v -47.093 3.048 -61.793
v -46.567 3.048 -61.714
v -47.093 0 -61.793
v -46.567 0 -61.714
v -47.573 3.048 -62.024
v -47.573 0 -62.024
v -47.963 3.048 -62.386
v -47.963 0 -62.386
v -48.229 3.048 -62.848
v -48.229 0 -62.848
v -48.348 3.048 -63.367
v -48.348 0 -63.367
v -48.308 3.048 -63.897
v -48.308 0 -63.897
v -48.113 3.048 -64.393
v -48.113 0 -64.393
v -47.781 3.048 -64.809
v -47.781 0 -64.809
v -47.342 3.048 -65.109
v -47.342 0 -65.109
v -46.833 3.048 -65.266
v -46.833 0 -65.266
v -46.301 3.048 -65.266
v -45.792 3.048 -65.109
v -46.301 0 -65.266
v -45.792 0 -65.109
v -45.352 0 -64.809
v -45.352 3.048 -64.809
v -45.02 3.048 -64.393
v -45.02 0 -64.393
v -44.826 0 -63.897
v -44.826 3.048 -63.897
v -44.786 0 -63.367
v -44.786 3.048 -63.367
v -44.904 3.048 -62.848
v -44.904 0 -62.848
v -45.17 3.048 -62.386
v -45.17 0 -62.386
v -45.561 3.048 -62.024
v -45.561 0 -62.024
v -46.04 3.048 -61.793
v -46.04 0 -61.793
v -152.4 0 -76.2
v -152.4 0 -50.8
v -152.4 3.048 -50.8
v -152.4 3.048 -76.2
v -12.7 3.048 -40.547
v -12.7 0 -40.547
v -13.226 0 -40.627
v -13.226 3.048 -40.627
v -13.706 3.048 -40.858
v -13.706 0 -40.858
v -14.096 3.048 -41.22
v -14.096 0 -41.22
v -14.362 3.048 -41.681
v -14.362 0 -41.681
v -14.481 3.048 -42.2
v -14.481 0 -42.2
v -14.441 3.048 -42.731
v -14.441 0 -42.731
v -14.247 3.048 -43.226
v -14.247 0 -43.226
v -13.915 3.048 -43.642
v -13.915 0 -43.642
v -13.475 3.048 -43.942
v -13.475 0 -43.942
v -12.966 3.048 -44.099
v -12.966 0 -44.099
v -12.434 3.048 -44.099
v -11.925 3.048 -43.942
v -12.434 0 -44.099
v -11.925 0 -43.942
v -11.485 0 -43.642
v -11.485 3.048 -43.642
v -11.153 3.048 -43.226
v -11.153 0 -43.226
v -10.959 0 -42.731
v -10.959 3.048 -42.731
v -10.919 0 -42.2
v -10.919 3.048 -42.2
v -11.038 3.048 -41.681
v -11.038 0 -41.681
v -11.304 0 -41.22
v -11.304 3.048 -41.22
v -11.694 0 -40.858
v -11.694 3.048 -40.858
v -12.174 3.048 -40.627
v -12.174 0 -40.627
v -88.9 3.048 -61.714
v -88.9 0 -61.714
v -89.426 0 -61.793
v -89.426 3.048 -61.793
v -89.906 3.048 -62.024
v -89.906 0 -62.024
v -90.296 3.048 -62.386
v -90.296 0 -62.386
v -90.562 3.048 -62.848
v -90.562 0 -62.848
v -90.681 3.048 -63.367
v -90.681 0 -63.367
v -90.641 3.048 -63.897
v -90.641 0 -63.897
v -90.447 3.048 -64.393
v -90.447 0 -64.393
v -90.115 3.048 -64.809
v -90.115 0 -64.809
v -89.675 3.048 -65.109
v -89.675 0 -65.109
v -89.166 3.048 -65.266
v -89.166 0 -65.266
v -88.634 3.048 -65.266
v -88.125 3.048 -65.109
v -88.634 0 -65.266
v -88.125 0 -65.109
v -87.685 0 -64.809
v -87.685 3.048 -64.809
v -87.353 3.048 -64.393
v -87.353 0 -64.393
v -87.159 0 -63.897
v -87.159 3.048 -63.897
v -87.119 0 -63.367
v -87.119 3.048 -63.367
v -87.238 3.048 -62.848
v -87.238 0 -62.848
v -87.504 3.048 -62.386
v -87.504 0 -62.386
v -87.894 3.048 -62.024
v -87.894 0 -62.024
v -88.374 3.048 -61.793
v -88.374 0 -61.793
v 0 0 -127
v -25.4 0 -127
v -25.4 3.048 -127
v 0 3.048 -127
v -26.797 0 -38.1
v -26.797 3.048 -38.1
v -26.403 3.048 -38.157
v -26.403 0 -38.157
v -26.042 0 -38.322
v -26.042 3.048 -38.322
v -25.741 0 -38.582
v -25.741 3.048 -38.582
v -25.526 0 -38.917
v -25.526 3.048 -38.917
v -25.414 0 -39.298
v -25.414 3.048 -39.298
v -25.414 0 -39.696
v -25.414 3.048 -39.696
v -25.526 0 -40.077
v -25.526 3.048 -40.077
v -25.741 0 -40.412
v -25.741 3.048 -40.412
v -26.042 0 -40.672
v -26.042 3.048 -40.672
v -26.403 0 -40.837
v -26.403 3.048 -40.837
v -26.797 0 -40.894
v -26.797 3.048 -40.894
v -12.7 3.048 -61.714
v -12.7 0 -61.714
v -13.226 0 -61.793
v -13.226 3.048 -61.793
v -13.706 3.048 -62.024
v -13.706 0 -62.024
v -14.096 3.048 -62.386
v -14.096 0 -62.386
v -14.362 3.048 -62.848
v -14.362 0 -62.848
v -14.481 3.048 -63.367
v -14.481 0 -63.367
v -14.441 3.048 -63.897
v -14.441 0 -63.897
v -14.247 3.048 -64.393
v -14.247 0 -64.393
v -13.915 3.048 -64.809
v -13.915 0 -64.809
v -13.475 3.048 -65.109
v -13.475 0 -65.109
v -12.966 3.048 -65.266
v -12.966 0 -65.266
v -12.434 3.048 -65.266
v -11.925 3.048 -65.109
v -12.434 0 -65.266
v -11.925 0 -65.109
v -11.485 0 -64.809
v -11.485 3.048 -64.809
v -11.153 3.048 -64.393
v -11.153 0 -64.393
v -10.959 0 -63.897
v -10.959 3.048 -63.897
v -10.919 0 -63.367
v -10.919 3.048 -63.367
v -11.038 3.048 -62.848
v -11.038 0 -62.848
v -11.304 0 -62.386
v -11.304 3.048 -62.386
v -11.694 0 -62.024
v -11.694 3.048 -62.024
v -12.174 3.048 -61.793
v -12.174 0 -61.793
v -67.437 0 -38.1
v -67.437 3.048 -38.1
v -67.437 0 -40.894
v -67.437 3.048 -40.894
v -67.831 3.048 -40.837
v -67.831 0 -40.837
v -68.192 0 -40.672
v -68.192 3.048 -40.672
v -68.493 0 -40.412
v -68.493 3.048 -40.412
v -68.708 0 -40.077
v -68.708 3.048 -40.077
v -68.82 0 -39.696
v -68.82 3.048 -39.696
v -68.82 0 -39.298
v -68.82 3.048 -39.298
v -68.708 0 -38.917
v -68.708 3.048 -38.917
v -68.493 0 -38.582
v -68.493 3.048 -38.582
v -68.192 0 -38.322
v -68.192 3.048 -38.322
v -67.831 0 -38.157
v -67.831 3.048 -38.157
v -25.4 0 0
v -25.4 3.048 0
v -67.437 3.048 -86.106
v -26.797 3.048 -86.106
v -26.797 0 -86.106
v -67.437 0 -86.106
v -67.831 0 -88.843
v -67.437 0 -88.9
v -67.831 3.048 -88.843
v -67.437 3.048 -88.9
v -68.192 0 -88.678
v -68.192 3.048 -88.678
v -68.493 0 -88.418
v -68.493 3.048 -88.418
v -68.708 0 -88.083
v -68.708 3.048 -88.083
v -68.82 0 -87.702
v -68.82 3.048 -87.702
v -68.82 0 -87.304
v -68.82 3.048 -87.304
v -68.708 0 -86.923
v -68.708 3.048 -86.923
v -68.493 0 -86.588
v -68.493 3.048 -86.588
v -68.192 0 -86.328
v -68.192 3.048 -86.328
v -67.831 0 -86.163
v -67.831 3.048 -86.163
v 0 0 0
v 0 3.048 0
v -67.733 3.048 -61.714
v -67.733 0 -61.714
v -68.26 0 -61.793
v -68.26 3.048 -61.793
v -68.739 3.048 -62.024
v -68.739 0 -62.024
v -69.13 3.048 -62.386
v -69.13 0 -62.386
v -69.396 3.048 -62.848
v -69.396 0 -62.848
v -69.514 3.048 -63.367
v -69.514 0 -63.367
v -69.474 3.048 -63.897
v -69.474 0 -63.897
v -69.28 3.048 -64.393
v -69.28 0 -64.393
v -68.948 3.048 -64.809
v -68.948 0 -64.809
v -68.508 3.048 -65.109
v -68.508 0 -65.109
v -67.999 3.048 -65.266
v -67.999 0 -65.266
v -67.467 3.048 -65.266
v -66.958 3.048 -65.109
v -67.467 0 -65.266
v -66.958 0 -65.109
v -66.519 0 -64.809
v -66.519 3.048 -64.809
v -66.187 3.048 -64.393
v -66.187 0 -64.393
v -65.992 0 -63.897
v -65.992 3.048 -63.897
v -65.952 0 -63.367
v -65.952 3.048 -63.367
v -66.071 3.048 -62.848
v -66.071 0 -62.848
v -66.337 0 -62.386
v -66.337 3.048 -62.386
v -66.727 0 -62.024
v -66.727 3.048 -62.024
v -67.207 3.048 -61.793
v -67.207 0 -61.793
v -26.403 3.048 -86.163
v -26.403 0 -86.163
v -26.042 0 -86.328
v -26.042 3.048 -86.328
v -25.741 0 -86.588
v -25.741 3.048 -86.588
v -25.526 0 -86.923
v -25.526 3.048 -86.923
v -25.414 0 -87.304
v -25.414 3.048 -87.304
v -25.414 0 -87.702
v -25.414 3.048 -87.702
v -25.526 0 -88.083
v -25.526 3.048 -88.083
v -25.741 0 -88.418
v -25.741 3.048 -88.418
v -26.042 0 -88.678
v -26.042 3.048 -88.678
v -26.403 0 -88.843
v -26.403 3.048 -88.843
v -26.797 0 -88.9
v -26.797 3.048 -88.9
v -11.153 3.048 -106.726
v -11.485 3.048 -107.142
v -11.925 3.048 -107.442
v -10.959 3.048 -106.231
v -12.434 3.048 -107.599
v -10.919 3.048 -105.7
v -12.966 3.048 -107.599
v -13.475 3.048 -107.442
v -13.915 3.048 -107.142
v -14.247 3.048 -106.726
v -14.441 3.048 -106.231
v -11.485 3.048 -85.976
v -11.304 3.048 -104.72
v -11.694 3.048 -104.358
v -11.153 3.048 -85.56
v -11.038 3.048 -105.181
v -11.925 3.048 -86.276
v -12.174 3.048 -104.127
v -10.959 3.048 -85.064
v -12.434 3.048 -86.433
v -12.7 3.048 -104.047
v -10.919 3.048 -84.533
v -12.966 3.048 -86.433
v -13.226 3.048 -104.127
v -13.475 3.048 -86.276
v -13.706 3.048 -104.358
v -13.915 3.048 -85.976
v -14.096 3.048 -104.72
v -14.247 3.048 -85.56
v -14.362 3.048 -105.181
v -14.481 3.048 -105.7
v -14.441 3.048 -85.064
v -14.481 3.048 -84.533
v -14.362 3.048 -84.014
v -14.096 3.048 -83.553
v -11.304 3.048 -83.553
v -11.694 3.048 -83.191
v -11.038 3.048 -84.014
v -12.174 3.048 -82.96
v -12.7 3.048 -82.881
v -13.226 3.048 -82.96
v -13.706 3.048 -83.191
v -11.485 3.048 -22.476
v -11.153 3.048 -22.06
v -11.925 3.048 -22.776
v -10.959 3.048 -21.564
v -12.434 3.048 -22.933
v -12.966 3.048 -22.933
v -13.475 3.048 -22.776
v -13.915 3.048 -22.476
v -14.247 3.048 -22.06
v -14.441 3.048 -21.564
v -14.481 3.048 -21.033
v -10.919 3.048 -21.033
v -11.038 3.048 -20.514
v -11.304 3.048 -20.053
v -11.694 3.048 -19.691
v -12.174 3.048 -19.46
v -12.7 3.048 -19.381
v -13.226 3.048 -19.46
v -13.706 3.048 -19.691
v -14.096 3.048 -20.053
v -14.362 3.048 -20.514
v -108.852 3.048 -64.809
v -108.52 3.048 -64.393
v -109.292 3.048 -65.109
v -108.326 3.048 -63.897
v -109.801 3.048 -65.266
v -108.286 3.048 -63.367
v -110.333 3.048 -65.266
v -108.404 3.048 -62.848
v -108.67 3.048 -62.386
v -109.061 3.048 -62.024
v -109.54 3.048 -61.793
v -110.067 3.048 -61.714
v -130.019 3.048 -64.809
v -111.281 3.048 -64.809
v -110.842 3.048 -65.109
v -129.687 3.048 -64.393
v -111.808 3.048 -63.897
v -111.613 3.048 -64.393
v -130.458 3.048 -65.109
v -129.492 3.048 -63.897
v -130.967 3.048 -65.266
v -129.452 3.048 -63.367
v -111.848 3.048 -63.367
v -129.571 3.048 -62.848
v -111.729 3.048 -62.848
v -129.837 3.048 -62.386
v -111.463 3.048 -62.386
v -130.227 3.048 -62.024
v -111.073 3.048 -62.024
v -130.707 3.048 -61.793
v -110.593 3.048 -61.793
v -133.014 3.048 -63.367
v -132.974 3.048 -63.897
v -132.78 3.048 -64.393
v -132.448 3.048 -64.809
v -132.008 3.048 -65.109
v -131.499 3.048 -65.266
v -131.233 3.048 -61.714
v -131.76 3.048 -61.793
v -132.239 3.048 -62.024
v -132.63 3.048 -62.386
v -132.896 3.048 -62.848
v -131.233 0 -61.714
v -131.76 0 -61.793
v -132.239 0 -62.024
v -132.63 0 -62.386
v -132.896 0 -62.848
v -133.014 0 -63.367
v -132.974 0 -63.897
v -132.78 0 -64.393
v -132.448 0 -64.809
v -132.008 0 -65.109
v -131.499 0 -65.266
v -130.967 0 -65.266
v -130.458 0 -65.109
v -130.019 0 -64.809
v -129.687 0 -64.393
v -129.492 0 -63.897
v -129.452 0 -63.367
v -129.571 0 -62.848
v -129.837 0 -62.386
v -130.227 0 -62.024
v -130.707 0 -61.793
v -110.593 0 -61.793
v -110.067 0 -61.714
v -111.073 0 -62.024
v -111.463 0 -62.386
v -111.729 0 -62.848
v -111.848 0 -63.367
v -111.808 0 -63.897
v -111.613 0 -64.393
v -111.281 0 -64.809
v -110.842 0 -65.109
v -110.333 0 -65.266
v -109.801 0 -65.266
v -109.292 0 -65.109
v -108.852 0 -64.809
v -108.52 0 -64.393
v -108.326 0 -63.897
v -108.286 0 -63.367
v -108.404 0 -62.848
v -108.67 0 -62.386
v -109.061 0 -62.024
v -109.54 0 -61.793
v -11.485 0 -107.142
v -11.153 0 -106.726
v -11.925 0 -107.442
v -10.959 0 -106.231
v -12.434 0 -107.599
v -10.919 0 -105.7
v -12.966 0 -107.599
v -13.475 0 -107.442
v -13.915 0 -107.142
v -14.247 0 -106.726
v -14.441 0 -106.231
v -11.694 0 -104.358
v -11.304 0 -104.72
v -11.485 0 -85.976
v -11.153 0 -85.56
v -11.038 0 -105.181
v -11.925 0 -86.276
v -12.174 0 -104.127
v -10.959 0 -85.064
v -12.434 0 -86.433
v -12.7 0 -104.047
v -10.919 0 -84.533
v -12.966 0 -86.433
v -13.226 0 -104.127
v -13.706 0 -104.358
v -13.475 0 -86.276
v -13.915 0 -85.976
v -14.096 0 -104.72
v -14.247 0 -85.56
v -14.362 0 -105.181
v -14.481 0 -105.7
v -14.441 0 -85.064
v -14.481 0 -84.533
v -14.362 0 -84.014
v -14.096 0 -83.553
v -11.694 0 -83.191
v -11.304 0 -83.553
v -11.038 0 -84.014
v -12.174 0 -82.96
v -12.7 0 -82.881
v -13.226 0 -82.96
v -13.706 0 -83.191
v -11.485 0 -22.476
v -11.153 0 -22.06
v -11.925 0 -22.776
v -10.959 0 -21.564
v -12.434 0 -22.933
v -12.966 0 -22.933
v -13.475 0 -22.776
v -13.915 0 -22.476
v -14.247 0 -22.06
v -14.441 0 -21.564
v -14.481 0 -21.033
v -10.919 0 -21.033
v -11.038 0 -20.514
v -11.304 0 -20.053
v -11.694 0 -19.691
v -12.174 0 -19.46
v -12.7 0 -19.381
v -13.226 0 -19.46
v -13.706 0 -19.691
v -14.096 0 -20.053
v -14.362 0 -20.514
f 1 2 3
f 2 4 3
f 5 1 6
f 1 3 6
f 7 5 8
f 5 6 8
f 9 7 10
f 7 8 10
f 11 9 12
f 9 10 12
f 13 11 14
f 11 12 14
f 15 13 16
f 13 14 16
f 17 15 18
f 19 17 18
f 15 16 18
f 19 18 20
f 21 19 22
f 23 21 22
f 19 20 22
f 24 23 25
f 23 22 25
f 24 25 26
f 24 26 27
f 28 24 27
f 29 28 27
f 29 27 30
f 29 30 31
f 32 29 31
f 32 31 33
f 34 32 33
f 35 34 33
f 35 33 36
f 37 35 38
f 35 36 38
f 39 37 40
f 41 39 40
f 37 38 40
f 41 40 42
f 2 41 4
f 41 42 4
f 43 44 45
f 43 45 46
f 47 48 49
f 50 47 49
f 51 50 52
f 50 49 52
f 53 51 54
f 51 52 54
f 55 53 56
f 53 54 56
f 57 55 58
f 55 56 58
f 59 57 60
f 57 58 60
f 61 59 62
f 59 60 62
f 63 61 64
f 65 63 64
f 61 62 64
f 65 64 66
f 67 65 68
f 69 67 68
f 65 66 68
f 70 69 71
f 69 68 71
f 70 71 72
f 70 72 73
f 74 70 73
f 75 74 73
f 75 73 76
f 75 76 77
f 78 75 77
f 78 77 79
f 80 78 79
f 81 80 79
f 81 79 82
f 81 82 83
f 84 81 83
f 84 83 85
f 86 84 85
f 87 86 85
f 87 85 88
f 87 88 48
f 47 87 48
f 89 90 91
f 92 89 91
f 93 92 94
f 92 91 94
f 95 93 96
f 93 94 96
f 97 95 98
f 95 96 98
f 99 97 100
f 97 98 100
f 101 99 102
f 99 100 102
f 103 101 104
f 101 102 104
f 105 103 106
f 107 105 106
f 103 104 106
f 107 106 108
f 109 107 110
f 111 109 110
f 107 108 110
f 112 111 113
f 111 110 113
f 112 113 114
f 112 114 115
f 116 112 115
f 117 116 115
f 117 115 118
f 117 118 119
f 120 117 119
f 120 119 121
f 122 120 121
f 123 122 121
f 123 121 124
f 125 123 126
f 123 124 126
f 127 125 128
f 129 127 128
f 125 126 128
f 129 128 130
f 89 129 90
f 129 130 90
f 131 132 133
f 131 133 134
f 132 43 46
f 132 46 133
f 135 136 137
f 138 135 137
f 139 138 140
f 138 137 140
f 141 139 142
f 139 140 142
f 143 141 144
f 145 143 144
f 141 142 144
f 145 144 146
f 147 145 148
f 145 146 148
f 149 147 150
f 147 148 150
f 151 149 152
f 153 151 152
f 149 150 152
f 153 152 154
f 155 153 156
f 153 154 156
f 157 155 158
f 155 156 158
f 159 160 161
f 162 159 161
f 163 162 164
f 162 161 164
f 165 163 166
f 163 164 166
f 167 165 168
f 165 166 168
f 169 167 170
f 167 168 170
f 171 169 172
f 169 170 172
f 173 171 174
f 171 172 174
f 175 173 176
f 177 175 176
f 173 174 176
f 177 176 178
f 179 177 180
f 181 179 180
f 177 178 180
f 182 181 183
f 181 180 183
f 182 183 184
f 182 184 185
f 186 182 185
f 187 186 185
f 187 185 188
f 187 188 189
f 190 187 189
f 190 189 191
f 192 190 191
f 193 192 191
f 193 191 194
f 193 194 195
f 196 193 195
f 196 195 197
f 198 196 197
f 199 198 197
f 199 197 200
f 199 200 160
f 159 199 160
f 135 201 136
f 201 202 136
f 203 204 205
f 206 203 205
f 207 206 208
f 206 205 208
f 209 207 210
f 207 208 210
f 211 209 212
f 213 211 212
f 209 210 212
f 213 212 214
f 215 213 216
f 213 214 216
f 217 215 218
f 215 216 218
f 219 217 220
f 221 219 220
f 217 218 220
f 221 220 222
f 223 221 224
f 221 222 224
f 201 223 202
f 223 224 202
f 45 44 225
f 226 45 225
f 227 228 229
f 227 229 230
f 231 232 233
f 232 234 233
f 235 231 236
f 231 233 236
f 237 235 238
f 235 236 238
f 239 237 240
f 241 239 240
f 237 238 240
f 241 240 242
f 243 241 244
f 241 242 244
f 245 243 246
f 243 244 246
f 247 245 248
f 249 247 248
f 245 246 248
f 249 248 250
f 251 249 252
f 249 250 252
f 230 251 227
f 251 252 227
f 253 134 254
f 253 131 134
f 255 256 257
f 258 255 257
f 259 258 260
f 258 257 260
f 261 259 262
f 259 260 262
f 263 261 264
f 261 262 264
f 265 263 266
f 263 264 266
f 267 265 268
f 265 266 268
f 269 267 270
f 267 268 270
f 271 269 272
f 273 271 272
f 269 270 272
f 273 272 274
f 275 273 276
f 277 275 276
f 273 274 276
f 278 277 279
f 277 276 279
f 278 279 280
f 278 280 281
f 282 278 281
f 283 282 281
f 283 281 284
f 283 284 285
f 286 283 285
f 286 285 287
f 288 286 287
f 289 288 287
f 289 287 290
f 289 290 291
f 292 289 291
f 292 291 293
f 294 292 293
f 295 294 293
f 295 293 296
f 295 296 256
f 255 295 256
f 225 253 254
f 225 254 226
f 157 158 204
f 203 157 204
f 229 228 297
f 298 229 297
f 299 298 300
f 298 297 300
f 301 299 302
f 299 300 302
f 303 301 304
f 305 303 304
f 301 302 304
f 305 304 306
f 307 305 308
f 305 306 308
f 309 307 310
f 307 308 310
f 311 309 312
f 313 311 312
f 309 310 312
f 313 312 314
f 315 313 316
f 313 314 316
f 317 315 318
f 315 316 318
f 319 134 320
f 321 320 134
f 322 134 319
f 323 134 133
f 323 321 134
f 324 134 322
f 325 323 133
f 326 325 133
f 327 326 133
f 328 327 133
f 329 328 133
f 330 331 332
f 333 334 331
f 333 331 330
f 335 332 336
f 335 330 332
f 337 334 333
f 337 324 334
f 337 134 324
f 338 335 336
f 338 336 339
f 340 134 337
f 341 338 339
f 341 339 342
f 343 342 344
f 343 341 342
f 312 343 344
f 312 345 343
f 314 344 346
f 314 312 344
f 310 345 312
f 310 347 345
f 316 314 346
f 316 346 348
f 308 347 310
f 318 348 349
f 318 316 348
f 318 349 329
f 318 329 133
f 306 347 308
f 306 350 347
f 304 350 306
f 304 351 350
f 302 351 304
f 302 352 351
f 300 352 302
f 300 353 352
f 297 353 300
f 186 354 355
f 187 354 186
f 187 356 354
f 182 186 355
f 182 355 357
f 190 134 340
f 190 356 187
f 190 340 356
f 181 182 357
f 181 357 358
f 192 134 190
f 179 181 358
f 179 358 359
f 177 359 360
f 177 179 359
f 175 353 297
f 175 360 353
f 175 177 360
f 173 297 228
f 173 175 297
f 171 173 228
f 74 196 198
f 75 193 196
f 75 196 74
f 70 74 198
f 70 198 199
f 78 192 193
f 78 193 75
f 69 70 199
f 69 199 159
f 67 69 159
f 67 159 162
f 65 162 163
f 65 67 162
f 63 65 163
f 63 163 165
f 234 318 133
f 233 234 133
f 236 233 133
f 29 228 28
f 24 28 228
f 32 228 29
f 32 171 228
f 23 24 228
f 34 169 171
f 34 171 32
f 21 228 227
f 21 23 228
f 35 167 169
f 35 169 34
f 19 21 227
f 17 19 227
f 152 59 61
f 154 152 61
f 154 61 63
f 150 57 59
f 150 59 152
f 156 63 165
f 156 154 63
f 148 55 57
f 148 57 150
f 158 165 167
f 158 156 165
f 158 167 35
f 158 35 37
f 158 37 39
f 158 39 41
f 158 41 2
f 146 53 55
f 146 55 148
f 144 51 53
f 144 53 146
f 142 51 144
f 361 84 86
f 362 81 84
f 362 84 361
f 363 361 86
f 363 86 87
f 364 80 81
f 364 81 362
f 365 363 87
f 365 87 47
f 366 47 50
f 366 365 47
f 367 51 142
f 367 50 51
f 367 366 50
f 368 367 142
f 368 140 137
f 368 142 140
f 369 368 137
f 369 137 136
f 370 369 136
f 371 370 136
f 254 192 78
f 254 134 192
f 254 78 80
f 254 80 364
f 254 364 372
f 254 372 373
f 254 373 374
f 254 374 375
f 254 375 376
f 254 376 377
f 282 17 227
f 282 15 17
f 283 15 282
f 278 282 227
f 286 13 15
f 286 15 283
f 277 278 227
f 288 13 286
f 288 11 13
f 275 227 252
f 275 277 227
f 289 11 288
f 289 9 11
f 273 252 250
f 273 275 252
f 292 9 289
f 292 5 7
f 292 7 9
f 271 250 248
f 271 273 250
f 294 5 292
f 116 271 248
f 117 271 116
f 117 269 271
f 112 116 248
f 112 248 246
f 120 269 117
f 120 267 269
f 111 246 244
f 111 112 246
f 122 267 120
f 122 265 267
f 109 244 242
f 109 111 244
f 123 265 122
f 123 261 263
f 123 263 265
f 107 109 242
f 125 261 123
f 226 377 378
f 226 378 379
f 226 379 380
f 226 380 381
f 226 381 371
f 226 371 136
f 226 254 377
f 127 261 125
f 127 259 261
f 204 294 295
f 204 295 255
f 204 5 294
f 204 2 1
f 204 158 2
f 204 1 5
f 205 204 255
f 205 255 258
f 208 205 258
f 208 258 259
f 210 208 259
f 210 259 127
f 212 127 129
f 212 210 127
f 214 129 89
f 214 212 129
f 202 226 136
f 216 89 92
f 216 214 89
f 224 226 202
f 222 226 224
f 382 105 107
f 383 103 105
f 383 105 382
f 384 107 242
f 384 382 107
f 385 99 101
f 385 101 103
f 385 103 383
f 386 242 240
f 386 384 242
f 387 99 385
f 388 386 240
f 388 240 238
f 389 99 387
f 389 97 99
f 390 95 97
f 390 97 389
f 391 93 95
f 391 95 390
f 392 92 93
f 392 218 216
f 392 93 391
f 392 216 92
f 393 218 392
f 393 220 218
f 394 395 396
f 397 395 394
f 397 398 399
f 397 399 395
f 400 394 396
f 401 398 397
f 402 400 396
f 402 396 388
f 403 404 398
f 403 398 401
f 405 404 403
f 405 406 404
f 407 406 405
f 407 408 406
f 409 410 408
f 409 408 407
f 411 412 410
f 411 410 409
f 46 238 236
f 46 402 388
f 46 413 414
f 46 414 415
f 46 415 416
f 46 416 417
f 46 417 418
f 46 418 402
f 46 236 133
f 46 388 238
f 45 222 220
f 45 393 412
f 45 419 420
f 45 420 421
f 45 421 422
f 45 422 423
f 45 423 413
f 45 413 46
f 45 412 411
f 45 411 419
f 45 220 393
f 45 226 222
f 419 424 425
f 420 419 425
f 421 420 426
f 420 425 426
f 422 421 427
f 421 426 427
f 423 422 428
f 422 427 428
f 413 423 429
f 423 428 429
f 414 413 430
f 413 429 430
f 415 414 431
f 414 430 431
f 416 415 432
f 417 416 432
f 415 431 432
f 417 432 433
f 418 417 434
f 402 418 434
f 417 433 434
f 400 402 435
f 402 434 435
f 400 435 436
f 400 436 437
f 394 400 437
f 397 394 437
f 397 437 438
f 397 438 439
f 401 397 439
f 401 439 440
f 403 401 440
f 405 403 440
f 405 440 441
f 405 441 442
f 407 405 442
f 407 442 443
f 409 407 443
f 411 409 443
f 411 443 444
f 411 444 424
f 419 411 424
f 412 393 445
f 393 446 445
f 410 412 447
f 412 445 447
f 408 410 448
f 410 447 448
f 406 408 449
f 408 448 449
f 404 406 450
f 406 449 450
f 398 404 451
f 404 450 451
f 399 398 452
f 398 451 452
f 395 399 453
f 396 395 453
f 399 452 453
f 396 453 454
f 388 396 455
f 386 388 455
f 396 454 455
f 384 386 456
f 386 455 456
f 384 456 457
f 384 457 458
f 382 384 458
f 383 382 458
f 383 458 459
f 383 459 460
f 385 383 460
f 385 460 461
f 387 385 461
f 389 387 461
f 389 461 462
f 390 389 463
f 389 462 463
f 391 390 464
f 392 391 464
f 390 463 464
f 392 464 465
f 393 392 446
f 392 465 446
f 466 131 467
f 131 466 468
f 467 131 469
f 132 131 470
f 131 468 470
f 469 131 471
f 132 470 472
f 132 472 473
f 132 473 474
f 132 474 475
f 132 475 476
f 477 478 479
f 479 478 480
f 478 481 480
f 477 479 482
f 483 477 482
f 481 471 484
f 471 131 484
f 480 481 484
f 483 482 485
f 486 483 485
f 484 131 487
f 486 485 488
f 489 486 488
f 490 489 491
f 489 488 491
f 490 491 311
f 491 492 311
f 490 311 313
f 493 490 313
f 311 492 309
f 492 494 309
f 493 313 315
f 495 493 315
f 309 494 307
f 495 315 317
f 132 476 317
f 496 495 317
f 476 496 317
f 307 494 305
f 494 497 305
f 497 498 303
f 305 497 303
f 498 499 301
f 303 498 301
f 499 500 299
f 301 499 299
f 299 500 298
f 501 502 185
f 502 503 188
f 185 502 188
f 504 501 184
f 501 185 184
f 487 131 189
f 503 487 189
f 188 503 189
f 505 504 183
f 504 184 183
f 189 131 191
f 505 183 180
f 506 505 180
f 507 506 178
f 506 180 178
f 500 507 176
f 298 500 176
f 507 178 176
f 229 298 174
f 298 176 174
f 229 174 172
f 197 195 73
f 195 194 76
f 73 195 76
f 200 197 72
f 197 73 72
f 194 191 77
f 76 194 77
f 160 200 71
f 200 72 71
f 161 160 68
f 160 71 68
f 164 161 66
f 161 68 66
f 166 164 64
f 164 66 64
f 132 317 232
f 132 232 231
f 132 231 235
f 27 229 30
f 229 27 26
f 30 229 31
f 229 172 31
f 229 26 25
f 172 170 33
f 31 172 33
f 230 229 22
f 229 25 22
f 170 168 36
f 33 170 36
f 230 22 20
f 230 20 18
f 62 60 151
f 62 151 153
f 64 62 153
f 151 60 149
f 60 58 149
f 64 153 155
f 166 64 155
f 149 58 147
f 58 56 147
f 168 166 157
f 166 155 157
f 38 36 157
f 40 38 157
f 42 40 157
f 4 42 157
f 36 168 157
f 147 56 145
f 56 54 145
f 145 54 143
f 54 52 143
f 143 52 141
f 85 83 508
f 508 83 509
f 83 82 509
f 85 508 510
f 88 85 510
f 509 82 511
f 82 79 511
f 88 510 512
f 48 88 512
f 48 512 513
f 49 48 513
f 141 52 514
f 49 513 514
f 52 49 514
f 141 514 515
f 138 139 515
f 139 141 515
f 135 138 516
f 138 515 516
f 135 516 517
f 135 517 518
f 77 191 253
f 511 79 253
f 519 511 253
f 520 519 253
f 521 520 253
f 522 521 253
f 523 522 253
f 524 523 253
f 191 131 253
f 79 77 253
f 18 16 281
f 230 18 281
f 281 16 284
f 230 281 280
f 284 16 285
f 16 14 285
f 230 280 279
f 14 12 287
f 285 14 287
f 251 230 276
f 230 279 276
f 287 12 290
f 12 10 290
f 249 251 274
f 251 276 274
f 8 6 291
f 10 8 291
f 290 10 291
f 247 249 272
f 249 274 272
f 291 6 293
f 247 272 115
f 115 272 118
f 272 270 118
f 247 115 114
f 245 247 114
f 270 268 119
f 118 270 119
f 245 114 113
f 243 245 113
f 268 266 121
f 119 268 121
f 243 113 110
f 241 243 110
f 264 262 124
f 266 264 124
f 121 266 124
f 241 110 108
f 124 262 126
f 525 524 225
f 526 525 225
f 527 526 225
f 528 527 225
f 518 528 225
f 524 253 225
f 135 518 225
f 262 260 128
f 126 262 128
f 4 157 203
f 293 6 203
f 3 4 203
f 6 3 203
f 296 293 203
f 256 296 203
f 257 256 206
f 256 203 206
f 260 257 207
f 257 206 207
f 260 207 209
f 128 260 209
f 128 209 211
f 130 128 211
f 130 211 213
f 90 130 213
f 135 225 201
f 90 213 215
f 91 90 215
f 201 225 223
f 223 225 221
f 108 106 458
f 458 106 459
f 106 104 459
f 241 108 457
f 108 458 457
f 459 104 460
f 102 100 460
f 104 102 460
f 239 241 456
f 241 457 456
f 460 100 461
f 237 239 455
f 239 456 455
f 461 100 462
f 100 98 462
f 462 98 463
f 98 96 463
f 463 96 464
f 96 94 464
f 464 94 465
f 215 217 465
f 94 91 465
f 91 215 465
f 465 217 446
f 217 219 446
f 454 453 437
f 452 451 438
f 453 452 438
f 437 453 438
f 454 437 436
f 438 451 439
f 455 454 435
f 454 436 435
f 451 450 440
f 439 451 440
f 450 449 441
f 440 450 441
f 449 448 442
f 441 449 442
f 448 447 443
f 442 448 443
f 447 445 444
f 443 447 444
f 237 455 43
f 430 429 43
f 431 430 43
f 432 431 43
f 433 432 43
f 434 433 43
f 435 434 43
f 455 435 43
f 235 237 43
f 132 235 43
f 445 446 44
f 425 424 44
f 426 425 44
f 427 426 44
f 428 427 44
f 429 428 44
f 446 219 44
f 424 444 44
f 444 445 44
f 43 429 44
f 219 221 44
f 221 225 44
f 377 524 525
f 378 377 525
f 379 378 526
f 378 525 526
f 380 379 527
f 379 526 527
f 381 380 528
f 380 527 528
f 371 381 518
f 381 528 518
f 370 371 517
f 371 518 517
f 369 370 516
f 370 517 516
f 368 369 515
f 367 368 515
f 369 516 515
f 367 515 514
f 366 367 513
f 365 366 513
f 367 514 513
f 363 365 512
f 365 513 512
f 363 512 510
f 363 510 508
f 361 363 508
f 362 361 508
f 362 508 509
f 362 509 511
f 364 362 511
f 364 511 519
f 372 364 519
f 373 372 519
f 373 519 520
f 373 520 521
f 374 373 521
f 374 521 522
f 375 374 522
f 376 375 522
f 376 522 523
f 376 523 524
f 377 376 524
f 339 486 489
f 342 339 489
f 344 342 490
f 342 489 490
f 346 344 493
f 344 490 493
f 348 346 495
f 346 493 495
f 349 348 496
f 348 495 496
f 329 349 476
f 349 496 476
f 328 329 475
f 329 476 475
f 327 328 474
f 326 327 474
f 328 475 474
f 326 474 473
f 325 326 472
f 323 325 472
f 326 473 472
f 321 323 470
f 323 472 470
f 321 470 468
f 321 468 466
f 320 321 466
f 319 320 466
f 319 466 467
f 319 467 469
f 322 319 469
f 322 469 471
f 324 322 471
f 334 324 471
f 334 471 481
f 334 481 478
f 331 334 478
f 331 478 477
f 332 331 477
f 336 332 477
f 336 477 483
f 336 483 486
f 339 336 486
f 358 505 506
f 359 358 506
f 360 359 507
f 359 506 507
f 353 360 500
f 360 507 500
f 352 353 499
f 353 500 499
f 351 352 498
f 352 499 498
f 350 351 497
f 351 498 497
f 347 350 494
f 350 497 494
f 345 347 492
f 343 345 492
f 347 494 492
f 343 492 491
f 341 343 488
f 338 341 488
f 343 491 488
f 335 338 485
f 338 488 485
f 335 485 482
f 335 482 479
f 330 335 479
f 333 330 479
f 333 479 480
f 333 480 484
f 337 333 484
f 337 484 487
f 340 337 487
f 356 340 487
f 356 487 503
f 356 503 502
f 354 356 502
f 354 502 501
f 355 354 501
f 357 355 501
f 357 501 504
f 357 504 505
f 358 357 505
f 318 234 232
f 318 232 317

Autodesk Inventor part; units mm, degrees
ref_plane "YZ Plane" through (0, 0, 0) normal (1, 0, 0) x (0, 1, 0)
ref_plane "XZ Plane" through (0, 0, 0) normal (0, 1, 0) x (-1, 0, 0)
ref_plane "XY Plane" through (0, 0, 0) normal (0, 0, 1) x (1, 0, 0)
sketch "face_sketch" plane through (0, 0, 0) normal (0, 1, 0) x (-1, 0, 0)
  line L0 (0, 0) -> (25.4, 0)
  line L1 (25.4, 0) -> (25.4, -127)
  line L2 (25.4, -127) -> (0, -127)
  line L3 (0, -127) -> (0, 0)
  line L4 (25.4, -50.8) -> (152.4, -50.8)
  line L5 (152.4, -50.8) -> (152.4, -76.2)
  line L6 (152.4, -76.2) -> (25.4, -76.2)
  line L7 (25.4, -76.2) -> (25.4, -50.8)
  line L8 (152.4, -50.8) -> (25.4, 0)
  line L9 (152.4, -76.2) -> (25.4, -127)
  dimension "d0" = 25.4
  dimension "d1" = 127
  dimension "d2" = 127
  dimension "d3" = 25.4
extrude "Plate1" add sketch "face_sketch" along normal blind 3.048
sketch "rivet_holes_sketch" plane through (0, 3.048, 0) normal (0, 1, 0) x (1, 0, 0)
  line L0 (-25.4, 0) -> (-152.4, 50.8) projected
  line L1 (0, 0) -> (-25.4, 0) projected
  line L2 (0, 127) -> (0, 0) projected
  line L3 (-25.4, 127) -> (0, 127) projected
  line L4 (-152.4, 76.2) -> (-25.4, 127) projected
  line L5 (-152.4, 50.8) -> (-152.4, 76.2) projected
  line L6 (-25.4, 127) -> (-25.4, 0) construction
  line L7 (0, 127) -> (-25.4, 127) construction
  line L8 (-25.4, 0) -> (0, 0) construction
  line L9 (-152.4, 76.2) -> (-152.4, 50.8) construction
  line L10 (-152.4, 63.5) -> (-131.2333, 63.5) construction
  line L11 (-131.2333, 63.5) -> (-110.0667, 63.5) construction
  line L12 (-110.0667, 63.5) -> (-88.9, 63.5) construction
  line L13 (-88.9, 63.5) -> (-67.7333, 63.5) construction
  line L14 (-67.7333, 63.5) -> (-46.5667, 63.5) construction
  line L15 (-46.5667, 63.5) -> (-25.4, 63.5) construction
  line L16 (-12.7, 0) -> (-12.7, 21.1667) construction
  line L17 (-12.7, 21.1667) -> (-12.7, 42.3333) construction
  line L18 (-12.7, 42.3333) -> (-12.7, 63.5) construction
  line L19 (-12.7, 63.5) -> (-12.7, 84.6667) construction
  line L20 (-12.7, 84.6667) -> (-12.7, 105.8333) construction
  line L21 (-12.7, 105.8333) -> (-12.7, 127) construction
hole "rivet_holes" at (-131.2333, 3.048, -63.5) at (-110.0667, 3.048, -63.5) at (-88.9, 3.048, -63.5) at (-67.7333, 3.048, -63.5) at (-46.5667, 3.048, -63.5) at (-12.7, 3.048, -21.1667) at (-12.7, 3.048, -42.3333) at (-12.7, 3.048, -63.5) at (-12.7, 3.048, -84.6667) at (-12.7, 3.048, -105.8333) direction (0, -1, 0) diameter 3.5719 depth 3.048 tip angle 118
sketch "hm_mounting_slot_sketch" plane through (0, 3.048, 0) normal (0, 1, 0) x (1, 0, 0)
  line L0 (-67.437, 87.503) -> (-26.797, 87.503) construction
  line L1 (-67.437, 88.9) -> (-26.797, 88.9)
  line L2 (-26.797, 86.106) -> (-67.437, 86.106)
  arc A0 (-67.437, 88.9) -> (-67.437, 86.106) centre (-67.437, 87.503) ccw
  arc A1 (-26.797, 86.106) -> (-26.797, 88.9) centre (-26.797, 87.503) ccw
  line L3 (-67.437, 39.497) -> (-26.797, 39.497) construction
  line L4 (-67.437, 38.1) -> (-26.797, 38.1)
  line L5 (-26.797, 40.894) -> (-67.437, 40.894)
  arc A2 (-67.437, 40.894) -> (-67.437, 38.1) centre (-67.437, 39.497) ccw
  arc A3 (-26.797, 38.1) -> (-26.797, 40.894) centre (-26.797, 39.497) ccw
  line L6 (-25.4, 0) -> (-25.4, 127) construction
  line L7 (-68.834, 87.503) -> (-68.834, 109.6264) construction
  line L8 (-25.4, 127) -> (-152.4, 76.2) projected
  line L9 (-68.834, 39.497) -> (-68.834, 17.3736) construction
  line L10 (-152.4, 50.8) -> (-25.4, 0) projected
  point P0 (0, 0)
  point P1 (-47.117, 87.503)
  point P2 (-47.117, 39.497)
  point P3 (-25.4, 39.497)
  point P4 (-25.4, 87.503)
  point P5 (-68.834, 28.4353)
  dimension "d12" = 40.64
  dimension "d14" = 2.794
  dimension "d15" = 40.64
  dimension "d16" = 2.794
  dimension "d17" = 50.8
extrude "Cut1" cut sketch "hm_mounting_slot_sketch" against normal blind 3.048
equation "\"d5\" = rv_hole_diameter"
equation "\"d10\" = Thickness"
equation "\"d12\" = tb_hm_mounting_slot_length"
equation "\"d15\" = tb_hm_mounting_slot_length"
equation "\"d17\" = hm_base_length"
equation "\"d18\" = Thickness"
equation "\"d0\" = st_outer_diameter"
equation "\"d1\" = tb_rivet_row_length"
equation "\"d2\" = tb_rivet_row_length"
equation "\"d3\" = st_outer_diameter"
equation "\"Thickness\" = tb_metal_thickness"
equation "\"BendRadius\" = Thickness"
equation "\"BendReliefWidth\" = Thickness"
equation "\"BendReliefDepth\" = 0.5 * Thickness"
equation "\"CornerReliefSize\" = 4 * Thickness"
equation "\"MinimumRemnant\" = 2 * Thickness"
equation "\"TransitionRadius\" = BendRadius"
equation "\"JacobiRadiusSize\" = BendRadius"
equation "\"GapSize\" = Thickness"
equation "\"bp_thickness\" = 3.048"
equation "\"bp_height\" = gb_mh_seperation + st_outer_diameter"
equation "\"bp_width\" = 4 * st_rivet_distance"
equation "\"bp_axle_height\" = magic_axle_offset + gb_axle_from_edge + gb_to_bottom_of_side_assembly"
equation "\"magic_axle_offset\" = 2.286"
equation "\"bp_tensioner_width\" = 6.35"
equation "\"bp_tensioner_height\" = 50.8"
equation "\"bp_tensioner_from_bottom\" = 38.1"
equation "\"bp_tensioner_from_side\" = 25.4"
equation "\"bp_tensioner_wood_mount_from_tensioner_top\" = 12.7"
equation "\"bp_tensioner_wood_mount_diameter\" = 6.35"
equation "\"gb_mh_seperation\" = 111.1504"
equation "\"gb_mh_diameter\" = 6.35"
equation "\"gb_axle_from_edge\" = 38.1"
equation "\"gb_width\" = 127"
equation "\"gb_bearing_diameter\" = 28.575"
equation "\"gb_to_bottom_of_side_assembly\" = 4.7752"
equation "\"rv_hole_diameter\" = 3.57187"
equation "\"st_outer_diameter\" = 25.4"
equation "\"st_wall_thickness\" = 1.5875"
equation "\"st_length\" = 685.8"
equation "\"st_gbmh_from_center\" = 0.5 * gb_mh_seperation"
equation "\"st_cutout_depth_right\" = 203.2"
equation "\"st_cutout_depth_left\" = 203.2"
equation "\"st_rivet_distance\" = 19.05"
equation "\"so_inner_diameter\" = 7.62"
equation "\"so_wall_thickness\" = 5.08"
equation "\"so_length\" = 40.64"
equation "\"twb_width\" = st_outer_diameter"
equation "\"twb_length\" = bp_tensioner_width + 2 * twb_margin_on_each_side"
equation "\"twb_height\" = 2 * bp_tensioner_wood_mount_diameter + bp_tensioner_height + 2 * bp_tensioner_wood_mount_from_tensioner_top + twb_margin_on_each_side"
equation "\"twb_margin_on_each_side\" = 6.35"
equation "\"twb_tensioner_from_edge\" = -0.5 * bp_tensioner_height + 0.5 * twb_height"
equation "\"tb_side_length\" = 127"
equation "\"tb_rivet_row_length\" = 127"
equation "\"d4\" = BendRadius"
equation "\"tb_metal_thickness\" = 3.048"
equation "\"tb_hm_mounting_slot_length\" = 40.64"
equation "\"hm_base_width\" = 30.48"
equation "\"hm_base_length\" = 50.8"
equation "\"hm_moon_flange_radius\" = 17.78"
equation "\"hm_moon_channel_offset\" = 2.286"
equation "\"hm_moon_flange_width\" = 5.08"
equation "\"hm_moon_thickness\" = 5.08"
equation "\"hm_base_height\" = 5.08"
equation "\"hm_peg_width\" = 2.54"
equation "\"hm_peg_length\" = 5.08"
equation "\"hm_peg_height\" = 5.08"
equation "\"hm_rivet_groove_width\" = 10.16"
equation "\"hm_rivet_groove_height\" = 1.27"
equation "\"gb_mh_seperation_alt\" = 111.125"
equation "\"gb_axle_from_edge_alt\" = 43.1546"
equation "\"bp_axle_height_alt\" = magic_axle_offset + gb_axle_from_edge_alt + gb_to_bottom_of_side_assembly"
properties part number "traingle_bracket(tb)" material "Aluminum 6061"
